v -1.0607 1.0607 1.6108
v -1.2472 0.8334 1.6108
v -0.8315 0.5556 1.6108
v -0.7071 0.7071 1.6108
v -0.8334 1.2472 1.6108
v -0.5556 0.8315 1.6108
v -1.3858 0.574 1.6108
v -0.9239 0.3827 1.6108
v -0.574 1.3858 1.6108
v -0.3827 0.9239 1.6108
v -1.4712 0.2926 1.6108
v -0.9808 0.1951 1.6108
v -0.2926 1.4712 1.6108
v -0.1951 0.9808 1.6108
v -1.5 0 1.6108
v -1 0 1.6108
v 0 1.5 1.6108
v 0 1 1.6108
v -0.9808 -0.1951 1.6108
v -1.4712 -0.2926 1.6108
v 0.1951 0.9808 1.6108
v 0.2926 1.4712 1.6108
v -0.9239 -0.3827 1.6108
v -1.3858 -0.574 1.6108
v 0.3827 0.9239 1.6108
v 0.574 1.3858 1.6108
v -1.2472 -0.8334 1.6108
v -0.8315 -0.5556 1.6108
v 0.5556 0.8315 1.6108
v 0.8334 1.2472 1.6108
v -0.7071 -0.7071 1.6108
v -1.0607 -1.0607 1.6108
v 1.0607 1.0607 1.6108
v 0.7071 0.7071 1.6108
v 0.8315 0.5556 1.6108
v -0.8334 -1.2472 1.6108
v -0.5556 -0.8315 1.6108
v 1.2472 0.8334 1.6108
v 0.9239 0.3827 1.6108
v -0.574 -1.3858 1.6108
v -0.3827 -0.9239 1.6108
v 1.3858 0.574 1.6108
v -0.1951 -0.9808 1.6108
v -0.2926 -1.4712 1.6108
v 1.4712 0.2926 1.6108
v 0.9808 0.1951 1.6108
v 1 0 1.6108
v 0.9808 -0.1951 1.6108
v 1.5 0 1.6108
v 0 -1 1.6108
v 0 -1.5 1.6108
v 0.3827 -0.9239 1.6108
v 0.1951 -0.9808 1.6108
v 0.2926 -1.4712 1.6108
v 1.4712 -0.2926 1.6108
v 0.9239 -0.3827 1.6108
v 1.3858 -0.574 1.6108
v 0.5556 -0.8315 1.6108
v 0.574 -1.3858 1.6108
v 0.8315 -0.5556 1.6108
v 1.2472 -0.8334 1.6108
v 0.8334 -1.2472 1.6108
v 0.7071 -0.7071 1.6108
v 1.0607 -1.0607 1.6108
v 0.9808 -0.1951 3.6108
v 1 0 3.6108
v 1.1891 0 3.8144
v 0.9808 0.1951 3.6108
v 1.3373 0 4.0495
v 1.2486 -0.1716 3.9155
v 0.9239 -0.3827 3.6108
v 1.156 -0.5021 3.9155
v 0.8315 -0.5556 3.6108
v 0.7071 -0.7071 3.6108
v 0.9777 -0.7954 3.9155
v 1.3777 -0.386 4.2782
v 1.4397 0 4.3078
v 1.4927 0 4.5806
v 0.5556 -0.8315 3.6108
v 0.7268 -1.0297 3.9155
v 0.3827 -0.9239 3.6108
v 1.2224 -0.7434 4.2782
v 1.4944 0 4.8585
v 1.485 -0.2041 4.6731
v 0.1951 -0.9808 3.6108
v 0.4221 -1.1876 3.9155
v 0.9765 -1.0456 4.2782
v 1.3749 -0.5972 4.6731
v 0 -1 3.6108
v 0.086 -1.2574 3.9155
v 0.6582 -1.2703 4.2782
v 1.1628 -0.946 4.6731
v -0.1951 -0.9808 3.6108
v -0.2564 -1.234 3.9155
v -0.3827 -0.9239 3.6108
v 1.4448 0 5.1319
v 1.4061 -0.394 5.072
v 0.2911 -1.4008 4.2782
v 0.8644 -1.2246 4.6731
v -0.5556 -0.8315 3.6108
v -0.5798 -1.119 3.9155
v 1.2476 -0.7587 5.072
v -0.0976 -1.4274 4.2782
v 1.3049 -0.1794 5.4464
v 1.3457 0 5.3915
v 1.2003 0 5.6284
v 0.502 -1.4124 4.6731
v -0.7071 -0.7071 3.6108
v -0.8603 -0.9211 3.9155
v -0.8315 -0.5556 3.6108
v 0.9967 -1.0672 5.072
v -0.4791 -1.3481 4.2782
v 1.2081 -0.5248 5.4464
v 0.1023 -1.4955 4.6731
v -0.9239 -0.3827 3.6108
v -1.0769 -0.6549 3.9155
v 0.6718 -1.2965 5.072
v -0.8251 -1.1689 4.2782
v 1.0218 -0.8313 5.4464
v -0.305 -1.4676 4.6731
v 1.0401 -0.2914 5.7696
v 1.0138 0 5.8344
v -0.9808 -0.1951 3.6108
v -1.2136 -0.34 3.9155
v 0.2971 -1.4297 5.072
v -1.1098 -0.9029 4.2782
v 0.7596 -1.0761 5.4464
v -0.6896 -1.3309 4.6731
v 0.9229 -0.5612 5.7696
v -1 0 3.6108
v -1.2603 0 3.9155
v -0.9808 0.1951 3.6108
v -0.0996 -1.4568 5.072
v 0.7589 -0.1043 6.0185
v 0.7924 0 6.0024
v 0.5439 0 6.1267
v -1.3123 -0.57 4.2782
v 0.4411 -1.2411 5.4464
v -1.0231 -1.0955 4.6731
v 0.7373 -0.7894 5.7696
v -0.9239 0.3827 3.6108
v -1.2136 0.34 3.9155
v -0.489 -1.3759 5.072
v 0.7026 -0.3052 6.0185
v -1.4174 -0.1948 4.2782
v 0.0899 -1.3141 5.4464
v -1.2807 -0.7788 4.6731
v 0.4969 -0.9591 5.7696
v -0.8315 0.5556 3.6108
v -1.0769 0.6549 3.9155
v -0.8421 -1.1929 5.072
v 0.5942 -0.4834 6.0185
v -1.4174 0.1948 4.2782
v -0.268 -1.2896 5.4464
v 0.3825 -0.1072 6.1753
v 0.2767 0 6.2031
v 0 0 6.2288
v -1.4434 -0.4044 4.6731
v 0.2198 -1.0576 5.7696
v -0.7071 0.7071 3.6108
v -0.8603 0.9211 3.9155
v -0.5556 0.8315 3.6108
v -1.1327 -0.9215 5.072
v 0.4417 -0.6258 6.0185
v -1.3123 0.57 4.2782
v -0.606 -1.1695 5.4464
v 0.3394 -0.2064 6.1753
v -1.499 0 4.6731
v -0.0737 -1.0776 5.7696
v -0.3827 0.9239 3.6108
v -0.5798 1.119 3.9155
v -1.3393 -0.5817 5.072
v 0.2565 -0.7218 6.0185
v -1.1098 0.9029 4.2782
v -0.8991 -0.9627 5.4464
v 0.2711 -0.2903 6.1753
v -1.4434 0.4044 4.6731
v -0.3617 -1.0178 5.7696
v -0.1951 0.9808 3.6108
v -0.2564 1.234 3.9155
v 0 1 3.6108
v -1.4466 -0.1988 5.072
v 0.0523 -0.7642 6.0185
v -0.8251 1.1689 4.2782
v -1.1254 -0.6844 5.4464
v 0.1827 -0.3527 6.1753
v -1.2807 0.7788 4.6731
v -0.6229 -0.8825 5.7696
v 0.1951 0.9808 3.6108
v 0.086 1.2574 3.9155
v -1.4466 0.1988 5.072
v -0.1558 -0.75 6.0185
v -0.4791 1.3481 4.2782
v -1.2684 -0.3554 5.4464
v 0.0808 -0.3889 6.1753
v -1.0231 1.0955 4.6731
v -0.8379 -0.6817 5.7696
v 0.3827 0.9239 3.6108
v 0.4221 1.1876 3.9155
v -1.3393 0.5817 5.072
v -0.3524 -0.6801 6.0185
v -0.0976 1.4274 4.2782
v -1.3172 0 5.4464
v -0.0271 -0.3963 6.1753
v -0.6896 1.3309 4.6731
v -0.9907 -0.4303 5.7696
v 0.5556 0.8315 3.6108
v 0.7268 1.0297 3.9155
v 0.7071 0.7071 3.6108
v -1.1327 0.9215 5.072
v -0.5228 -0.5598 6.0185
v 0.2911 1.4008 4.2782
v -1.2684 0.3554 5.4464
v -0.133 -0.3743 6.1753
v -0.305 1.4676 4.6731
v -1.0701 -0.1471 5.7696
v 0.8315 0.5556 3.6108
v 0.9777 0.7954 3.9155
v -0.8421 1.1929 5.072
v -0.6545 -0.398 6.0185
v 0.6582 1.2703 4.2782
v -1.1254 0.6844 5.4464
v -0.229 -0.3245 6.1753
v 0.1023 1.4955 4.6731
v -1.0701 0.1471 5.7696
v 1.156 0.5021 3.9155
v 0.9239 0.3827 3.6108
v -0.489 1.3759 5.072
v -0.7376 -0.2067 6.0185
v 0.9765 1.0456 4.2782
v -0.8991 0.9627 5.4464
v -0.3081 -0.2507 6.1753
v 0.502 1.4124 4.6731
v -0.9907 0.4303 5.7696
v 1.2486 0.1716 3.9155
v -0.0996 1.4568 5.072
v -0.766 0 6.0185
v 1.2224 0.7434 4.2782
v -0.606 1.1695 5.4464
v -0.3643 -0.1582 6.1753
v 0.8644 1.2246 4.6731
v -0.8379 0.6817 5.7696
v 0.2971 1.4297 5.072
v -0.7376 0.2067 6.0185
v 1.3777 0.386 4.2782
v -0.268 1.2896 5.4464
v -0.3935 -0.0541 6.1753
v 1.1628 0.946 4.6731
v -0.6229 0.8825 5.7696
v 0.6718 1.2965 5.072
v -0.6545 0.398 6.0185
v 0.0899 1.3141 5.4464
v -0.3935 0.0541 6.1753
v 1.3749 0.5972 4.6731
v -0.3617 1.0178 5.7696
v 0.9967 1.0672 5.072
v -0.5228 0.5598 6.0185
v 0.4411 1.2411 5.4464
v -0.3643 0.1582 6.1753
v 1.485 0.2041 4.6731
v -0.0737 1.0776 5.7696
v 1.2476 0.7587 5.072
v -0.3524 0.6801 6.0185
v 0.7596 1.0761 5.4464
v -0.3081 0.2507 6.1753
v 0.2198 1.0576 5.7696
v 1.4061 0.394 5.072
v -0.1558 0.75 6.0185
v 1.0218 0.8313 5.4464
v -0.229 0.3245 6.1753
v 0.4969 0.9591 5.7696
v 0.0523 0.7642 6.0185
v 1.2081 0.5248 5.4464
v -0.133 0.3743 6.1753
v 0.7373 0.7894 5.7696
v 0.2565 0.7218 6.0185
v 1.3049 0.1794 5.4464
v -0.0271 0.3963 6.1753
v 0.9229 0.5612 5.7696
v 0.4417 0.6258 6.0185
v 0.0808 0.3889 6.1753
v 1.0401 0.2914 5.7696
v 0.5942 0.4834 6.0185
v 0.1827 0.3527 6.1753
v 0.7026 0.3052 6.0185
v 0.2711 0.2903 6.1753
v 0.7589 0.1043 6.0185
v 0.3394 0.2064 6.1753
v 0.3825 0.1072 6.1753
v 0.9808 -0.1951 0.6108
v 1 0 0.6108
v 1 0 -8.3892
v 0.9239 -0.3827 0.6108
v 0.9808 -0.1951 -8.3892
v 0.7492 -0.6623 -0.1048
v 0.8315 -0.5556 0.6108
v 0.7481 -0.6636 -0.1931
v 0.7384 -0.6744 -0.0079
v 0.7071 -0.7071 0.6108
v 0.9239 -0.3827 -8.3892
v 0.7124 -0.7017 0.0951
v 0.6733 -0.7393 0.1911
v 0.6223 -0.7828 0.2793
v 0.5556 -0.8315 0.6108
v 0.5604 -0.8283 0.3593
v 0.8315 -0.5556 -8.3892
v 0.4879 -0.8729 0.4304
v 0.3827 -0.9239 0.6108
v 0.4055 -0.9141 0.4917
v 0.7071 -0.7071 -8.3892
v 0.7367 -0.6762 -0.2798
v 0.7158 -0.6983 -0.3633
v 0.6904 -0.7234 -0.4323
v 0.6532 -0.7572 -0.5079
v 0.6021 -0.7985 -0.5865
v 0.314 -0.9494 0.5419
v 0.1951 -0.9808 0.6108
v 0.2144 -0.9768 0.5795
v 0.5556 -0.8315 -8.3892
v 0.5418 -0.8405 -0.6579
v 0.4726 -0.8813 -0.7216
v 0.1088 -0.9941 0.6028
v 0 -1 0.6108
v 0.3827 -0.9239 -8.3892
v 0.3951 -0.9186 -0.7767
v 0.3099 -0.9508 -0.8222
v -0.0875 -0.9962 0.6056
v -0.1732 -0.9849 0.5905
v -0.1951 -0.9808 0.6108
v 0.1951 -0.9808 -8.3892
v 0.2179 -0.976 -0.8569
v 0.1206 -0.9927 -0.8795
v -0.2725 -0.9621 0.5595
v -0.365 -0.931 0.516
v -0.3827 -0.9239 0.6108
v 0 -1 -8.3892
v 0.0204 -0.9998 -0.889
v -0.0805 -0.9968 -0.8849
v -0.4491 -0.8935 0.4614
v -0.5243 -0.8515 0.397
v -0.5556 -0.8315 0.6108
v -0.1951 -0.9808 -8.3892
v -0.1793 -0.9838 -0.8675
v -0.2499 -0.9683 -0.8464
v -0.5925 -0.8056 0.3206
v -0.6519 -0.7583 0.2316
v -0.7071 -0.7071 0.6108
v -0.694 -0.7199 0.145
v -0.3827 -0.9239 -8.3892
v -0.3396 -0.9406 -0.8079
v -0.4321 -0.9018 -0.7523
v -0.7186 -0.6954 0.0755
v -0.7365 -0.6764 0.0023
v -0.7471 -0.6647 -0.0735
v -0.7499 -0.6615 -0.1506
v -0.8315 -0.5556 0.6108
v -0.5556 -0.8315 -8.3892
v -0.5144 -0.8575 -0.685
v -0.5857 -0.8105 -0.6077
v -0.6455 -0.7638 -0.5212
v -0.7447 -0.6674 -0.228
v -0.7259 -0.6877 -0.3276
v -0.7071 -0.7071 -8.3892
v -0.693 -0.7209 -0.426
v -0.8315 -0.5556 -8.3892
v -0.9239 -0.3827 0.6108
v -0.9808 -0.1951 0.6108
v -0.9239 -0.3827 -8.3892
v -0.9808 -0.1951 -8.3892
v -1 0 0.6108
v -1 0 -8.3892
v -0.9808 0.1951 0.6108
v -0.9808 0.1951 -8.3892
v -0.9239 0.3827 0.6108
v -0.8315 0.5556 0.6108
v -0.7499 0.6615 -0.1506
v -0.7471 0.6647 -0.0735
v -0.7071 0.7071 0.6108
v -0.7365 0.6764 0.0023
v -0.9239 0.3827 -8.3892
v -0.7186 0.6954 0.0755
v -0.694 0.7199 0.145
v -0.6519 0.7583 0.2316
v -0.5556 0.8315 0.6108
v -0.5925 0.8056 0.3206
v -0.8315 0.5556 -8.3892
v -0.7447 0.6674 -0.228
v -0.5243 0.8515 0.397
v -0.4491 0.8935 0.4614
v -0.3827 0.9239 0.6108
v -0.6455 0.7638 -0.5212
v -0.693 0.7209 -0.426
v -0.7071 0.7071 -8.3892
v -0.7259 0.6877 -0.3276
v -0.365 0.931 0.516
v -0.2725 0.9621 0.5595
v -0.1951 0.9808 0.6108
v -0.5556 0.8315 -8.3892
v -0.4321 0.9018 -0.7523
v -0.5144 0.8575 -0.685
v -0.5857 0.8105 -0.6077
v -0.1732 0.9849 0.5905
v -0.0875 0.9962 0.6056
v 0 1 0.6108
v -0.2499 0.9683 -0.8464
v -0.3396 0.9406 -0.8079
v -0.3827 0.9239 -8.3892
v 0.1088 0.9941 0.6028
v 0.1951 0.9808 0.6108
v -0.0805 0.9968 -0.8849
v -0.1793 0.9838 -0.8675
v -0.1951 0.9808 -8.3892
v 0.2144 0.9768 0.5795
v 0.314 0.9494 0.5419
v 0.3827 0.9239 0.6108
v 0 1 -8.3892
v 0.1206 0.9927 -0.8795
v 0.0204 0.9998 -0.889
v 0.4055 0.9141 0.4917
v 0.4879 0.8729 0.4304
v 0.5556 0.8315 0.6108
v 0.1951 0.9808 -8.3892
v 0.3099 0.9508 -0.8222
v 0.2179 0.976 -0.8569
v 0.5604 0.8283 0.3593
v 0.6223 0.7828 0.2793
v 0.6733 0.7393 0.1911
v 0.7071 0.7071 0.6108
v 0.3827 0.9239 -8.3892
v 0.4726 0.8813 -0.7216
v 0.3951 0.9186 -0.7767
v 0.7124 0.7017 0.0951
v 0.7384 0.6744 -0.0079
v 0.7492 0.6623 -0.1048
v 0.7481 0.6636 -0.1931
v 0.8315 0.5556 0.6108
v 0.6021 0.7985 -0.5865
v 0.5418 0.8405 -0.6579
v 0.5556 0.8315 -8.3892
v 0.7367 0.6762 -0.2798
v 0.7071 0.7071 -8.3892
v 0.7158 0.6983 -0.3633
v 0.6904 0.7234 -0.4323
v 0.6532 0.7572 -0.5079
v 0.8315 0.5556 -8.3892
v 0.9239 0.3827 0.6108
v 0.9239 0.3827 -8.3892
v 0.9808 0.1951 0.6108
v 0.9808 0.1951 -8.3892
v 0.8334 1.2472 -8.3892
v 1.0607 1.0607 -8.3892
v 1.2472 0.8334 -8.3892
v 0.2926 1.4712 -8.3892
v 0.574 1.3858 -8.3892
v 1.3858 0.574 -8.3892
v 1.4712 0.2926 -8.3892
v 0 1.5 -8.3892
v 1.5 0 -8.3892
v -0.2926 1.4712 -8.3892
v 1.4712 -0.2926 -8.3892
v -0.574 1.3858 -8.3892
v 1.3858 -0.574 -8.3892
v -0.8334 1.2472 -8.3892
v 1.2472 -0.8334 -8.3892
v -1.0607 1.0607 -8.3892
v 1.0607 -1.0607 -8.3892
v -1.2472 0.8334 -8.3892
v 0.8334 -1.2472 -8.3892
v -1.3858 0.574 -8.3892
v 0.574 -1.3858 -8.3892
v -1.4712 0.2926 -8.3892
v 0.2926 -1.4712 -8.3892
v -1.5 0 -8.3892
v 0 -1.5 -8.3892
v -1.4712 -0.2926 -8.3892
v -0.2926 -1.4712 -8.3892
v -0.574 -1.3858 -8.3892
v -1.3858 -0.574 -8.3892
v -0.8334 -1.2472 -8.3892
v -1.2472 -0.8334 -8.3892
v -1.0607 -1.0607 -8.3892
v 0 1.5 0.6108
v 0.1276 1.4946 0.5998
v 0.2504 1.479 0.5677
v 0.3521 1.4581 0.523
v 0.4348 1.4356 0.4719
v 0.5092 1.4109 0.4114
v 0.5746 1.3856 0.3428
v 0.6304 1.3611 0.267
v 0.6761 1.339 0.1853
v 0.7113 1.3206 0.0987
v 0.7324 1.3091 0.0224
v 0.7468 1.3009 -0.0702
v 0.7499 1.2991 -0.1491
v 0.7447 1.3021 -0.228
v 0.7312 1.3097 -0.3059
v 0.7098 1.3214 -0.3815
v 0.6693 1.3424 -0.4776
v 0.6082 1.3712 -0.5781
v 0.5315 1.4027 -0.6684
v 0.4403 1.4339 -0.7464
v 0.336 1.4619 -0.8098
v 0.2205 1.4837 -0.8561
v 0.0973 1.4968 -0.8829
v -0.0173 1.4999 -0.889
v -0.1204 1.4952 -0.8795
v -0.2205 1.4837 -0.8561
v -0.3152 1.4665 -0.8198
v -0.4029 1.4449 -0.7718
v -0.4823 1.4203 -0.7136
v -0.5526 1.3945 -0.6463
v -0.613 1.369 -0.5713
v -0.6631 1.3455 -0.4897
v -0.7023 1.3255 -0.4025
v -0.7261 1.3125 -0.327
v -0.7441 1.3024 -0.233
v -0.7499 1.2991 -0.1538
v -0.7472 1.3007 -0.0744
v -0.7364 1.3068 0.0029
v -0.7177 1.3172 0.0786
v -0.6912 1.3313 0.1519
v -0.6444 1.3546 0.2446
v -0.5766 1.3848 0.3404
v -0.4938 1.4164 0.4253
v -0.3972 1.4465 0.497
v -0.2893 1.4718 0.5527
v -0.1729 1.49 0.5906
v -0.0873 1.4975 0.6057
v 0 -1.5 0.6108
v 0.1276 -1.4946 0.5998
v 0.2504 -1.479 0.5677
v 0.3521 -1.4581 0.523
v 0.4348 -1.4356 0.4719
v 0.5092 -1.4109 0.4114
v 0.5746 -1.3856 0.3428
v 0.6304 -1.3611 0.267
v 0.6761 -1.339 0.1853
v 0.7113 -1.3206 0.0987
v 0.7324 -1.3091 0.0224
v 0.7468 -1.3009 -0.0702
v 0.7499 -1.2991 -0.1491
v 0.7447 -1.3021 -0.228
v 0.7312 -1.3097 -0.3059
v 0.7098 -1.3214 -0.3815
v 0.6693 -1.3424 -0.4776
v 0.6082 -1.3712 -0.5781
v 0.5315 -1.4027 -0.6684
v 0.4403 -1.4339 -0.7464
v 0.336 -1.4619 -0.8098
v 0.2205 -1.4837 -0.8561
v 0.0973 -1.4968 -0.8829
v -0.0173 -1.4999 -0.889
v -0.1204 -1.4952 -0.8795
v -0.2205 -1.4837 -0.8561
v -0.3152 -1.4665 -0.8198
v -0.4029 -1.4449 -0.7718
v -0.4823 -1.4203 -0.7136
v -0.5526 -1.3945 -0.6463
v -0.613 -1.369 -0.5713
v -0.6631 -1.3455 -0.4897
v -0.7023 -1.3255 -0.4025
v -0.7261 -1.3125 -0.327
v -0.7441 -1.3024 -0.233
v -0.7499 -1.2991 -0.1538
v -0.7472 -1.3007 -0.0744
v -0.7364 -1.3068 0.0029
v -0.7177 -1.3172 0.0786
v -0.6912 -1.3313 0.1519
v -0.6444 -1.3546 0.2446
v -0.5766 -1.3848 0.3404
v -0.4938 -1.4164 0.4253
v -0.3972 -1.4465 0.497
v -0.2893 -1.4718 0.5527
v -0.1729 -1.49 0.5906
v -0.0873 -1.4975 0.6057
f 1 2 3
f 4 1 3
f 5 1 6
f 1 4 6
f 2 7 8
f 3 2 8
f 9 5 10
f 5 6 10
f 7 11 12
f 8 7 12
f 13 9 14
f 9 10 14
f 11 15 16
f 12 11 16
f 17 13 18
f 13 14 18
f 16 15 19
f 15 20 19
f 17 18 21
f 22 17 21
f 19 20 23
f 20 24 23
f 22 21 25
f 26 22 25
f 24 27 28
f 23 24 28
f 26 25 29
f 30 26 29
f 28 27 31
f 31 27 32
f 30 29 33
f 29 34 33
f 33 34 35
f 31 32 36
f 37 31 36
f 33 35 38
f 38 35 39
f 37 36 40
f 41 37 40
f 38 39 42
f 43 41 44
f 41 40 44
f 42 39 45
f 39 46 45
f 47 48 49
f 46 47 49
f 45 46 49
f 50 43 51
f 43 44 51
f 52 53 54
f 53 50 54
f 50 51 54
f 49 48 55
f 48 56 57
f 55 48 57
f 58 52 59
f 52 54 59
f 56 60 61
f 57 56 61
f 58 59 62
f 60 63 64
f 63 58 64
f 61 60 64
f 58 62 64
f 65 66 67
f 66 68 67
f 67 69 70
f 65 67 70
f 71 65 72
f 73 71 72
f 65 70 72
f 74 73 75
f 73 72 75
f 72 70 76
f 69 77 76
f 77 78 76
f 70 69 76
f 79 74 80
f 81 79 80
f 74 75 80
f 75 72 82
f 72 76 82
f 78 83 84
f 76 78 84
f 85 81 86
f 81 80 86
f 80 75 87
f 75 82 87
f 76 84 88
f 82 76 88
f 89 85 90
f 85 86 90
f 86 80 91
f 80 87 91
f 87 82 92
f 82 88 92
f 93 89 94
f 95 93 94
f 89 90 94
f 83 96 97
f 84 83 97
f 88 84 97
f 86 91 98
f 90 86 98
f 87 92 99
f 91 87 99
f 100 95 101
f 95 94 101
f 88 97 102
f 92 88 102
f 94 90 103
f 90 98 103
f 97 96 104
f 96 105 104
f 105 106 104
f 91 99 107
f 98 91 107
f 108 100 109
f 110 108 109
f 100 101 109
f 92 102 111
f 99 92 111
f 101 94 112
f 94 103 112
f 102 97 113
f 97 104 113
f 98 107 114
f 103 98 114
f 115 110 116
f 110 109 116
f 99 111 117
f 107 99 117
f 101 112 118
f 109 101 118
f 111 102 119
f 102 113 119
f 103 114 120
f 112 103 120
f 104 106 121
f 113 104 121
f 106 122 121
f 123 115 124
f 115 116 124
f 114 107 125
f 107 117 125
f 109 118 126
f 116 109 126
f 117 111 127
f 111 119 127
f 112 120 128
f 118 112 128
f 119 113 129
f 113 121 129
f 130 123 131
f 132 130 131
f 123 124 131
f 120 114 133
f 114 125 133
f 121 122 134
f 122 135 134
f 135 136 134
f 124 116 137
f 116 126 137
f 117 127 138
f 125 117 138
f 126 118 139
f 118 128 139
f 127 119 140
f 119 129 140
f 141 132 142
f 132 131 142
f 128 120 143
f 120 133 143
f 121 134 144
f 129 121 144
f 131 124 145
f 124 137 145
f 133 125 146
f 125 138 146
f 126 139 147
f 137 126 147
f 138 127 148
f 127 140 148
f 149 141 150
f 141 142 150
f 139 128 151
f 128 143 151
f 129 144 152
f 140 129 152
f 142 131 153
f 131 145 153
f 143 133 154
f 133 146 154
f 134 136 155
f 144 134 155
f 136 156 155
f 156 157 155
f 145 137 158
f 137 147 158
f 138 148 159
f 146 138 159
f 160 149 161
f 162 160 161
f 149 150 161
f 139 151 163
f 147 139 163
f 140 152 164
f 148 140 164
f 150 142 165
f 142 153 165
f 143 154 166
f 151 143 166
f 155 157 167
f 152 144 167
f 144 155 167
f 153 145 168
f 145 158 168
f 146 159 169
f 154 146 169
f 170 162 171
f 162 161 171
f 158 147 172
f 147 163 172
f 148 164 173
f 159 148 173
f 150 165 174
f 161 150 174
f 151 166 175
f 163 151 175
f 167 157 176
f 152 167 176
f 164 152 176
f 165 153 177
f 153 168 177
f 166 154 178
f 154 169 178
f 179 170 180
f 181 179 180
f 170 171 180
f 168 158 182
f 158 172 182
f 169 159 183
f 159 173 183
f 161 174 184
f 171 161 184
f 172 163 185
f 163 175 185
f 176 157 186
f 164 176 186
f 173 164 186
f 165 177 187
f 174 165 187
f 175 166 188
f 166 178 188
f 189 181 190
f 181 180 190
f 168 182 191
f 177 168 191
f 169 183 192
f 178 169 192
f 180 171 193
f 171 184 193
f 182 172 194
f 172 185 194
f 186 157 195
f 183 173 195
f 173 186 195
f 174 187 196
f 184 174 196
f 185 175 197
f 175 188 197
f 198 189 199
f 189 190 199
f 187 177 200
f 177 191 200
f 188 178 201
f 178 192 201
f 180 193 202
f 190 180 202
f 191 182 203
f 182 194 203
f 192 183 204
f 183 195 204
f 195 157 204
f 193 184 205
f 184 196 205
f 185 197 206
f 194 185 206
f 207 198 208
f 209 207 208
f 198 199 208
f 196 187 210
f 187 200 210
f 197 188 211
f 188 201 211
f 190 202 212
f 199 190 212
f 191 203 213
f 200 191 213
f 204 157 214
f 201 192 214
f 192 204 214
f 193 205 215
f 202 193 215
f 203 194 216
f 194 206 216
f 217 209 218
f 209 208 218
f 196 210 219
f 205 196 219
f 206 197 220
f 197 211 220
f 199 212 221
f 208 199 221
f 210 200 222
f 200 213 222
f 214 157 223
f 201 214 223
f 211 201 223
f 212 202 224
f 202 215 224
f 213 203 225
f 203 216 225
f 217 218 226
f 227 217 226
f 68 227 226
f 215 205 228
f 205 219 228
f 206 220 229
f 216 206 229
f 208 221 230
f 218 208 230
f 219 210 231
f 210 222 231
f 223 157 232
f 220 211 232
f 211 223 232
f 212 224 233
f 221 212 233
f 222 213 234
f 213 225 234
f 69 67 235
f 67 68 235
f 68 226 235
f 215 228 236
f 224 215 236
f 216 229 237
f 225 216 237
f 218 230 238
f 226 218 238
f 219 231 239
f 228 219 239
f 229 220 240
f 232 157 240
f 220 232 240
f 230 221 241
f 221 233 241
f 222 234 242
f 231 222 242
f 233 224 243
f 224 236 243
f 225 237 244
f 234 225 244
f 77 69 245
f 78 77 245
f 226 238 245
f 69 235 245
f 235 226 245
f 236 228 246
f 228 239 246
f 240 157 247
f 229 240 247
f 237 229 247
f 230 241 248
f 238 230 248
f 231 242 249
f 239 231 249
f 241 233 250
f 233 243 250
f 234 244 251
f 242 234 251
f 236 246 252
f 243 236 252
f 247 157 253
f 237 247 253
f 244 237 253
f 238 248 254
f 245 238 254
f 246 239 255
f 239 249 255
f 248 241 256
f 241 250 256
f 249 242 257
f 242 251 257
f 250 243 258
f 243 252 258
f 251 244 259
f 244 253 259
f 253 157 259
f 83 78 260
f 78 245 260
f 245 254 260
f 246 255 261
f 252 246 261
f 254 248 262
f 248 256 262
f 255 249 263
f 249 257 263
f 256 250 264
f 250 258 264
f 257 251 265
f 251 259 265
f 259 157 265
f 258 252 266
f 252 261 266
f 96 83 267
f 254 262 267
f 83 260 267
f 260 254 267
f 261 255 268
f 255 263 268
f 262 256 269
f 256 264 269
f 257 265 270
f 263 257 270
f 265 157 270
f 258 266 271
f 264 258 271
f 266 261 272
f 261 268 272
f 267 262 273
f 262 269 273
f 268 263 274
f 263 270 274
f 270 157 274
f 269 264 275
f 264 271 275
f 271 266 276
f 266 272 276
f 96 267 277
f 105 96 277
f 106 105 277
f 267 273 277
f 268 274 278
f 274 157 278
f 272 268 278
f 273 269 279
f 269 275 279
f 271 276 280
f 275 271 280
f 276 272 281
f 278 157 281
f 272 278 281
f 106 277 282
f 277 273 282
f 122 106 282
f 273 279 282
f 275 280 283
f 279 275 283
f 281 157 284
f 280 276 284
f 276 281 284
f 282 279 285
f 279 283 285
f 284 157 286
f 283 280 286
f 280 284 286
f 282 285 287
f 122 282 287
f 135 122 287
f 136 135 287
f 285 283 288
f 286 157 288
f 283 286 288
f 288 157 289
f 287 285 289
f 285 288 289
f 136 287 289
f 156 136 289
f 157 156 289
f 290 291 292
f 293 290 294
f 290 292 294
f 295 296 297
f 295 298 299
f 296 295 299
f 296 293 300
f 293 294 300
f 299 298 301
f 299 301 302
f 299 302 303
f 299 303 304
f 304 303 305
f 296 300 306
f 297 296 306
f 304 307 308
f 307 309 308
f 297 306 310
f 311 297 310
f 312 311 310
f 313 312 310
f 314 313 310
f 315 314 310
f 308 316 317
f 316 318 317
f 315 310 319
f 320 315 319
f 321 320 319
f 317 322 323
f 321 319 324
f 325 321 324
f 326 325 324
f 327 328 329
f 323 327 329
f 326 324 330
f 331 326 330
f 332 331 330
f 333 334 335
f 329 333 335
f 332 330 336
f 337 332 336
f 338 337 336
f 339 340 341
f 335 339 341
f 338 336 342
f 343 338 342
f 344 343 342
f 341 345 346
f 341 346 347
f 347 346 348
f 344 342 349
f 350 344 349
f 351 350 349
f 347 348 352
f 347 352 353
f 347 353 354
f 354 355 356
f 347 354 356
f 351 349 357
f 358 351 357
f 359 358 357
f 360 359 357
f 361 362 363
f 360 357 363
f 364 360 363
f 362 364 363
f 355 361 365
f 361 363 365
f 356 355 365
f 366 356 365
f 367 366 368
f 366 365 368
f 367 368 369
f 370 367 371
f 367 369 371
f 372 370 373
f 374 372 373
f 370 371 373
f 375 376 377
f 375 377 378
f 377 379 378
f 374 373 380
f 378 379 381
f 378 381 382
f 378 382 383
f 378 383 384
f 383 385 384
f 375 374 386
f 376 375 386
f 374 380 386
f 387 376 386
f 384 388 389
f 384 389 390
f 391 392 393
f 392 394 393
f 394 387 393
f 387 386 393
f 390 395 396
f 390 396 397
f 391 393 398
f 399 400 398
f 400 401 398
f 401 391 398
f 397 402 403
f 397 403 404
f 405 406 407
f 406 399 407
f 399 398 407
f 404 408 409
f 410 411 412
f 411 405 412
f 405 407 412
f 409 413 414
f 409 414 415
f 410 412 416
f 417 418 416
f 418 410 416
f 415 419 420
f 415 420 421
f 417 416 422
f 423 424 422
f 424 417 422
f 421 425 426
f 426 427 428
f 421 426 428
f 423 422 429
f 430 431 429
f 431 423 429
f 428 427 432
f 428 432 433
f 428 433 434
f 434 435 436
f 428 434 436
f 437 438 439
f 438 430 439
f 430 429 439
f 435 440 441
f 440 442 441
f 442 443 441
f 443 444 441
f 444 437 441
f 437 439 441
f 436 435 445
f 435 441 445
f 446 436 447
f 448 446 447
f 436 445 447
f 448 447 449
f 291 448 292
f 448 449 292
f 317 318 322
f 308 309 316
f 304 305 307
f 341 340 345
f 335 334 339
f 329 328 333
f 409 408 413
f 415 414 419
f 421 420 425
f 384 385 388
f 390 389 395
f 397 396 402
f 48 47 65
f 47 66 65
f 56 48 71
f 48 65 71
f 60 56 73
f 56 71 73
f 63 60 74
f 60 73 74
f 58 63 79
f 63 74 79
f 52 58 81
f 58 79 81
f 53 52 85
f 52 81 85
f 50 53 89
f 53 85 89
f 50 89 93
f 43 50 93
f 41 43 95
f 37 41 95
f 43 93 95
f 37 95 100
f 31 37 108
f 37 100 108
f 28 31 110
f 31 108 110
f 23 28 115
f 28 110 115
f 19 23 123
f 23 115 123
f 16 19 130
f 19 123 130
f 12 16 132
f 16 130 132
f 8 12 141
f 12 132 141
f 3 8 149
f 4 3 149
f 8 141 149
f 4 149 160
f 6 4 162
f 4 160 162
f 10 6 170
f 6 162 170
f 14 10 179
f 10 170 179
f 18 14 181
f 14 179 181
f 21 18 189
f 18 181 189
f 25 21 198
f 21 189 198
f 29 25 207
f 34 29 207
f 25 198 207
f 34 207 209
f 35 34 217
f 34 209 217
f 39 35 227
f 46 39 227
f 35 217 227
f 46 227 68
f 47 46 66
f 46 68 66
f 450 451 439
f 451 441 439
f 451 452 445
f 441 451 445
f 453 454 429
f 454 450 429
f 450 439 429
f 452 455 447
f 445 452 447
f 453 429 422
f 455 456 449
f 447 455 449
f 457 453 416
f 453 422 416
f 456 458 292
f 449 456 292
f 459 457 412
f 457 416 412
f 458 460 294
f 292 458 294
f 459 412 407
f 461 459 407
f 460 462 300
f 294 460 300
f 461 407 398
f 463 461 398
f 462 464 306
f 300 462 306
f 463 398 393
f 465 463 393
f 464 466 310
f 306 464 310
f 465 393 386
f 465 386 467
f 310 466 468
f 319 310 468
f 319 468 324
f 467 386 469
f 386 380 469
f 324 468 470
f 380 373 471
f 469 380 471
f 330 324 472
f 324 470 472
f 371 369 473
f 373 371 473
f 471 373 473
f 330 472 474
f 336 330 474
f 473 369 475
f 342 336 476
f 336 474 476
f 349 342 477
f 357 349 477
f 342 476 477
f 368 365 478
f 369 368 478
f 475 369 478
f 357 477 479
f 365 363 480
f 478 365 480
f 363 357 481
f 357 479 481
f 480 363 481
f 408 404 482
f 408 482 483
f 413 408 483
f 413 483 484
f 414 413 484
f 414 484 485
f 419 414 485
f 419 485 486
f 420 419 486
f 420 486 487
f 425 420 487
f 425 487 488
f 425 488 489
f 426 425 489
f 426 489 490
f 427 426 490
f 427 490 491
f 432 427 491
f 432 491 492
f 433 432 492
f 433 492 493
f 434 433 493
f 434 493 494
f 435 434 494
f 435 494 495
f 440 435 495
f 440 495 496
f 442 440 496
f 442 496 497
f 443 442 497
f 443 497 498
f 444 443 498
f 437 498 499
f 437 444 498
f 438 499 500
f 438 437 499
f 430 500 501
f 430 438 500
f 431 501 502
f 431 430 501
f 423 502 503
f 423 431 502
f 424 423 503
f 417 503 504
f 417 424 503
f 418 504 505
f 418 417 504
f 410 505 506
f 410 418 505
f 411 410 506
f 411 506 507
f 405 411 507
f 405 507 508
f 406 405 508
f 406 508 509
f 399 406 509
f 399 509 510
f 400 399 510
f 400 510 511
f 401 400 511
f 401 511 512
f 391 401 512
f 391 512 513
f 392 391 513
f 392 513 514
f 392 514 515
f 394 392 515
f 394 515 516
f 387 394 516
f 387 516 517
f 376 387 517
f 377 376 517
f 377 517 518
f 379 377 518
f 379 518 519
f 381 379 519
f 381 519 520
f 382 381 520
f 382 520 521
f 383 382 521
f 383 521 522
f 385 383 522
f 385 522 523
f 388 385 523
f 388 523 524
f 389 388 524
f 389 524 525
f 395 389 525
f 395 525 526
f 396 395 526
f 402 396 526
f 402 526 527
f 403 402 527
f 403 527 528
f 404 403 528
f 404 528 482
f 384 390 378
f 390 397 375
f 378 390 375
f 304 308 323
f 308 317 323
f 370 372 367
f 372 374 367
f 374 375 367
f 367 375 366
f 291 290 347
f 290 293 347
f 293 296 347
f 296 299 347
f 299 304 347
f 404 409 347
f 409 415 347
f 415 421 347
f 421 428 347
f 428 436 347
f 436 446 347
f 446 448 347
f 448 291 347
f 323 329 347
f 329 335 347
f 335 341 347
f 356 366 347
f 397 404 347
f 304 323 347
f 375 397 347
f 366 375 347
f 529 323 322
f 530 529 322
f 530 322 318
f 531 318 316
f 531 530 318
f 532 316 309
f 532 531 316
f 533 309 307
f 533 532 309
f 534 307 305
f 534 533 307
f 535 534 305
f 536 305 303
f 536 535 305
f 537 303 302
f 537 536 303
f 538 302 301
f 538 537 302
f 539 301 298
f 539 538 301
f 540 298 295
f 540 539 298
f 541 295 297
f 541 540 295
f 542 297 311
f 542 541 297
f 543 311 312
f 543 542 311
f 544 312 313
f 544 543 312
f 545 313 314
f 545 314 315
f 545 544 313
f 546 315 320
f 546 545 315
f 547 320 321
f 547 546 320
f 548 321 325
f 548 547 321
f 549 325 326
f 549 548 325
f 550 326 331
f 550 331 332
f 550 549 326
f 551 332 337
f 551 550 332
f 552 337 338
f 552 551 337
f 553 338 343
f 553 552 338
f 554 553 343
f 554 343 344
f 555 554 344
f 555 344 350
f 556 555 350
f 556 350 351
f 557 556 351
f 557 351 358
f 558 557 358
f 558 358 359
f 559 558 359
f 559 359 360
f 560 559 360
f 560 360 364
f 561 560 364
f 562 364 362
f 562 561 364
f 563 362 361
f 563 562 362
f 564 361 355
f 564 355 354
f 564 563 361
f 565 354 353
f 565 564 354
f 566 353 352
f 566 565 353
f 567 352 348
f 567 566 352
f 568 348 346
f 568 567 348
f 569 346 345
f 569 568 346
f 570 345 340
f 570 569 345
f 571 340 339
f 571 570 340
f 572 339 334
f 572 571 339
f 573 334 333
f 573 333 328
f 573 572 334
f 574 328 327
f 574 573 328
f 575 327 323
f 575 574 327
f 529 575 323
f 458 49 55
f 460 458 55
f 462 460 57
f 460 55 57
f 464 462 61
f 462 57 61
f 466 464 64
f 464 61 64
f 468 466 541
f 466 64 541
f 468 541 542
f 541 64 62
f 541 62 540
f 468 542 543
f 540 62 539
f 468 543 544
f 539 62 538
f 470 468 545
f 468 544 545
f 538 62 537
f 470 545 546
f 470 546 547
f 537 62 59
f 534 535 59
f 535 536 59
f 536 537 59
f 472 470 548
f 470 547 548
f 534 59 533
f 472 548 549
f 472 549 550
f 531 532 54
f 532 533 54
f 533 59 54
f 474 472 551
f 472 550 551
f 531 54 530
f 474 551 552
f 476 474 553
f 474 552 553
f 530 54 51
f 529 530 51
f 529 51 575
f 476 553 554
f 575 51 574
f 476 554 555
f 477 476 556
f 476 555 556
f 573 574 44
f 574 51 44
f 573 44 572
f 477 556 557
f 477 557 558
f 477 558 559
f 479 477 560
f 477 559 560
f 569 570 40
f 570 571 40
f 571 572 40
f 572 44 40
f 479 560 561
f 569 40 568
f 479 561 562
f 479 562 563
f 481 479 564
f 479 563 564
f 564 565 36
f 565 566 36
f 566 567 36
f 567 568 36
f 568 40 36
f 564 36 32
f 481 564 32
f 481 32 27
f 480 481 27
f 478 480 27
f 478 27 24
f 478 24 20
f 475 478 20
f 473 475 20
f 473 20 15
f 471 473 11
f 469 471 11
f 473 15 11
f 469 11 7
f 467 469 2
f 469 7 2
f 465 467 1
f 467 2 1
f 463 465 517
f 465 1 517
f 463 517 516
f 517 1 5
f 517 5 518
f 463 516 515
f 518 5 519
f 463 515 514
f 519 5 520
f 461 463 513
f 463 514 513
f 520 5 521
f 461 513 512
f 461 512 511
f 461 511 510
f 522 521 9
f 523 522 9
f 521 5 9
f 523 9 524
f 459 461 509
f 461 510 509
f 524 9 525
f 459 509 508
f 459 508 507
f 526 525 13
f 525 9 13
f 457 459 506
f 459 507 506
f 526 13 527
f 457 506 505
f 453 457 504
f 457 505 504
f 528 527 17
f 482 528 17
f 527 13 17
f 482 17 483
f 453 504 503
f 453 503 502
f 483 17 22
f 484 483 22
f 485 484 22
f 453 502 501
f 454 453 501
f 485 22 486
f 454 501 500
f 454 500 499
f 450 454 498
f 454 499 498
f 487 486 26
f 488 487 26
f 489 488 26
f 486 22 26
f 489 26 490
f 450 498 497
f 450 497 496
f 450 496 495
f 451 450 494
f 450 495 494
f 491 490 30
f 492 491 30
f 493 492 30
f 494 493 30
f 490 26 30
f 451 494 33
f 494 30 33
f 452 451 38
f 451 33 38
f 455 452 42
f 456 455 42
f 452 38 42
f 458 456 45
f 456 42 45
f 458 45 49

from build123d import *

# Parameters (mm, degrees)
TAGLIO_ESTRUSIONE1_DEPTH      = 9.653279386
TAGLIO_ESTRUSIONE1_DEPTH_BACK = 9.653279386
SCHIZZO2_R                    = 0.75


with BuildPart() as part:
    # Schizzo1 → Rivoluzione1 (revolve)
    with BuildSketch(Plane(origin=(0, 0, 0), x_dir=(0, 0, -1), z_dir=(1, 0, 0)), mode=Mode.PRIVATE) as rivoluzione1_sk:
        with BuildLine():
            Line((8.389233822, 1.5), (-1.610766178, 1.5))
            Line((-1.610766178, 1.5), (-1.610766178, 1))
            Line((-1.610766178, 1), (-3.610766178, 1))
            ThreePointArc((-3.610766178, 1), (-5.264033301, 1.401258538), (-6.228800167, 0))
            Line((-6.228800167, 0), (-0.610766178, 0))
            Line((-0.610766178, 0), (-0.610766178, 1))
            Line((-0.610766178, 1), (8.389233822, 1))
            Line((8.389233822, 1), (8.389233822, 1.5))
        make_face()
    revolve(rivoluzione1_sk.sketch.rotate(Axis((0, 0, 6.228800167), (0, 0, -1)), 90), axis=Axis((0, 0, 6.228800167), (0, 0, -1)))

    # Schizzo2 → Taglio-Estrusione1 (cut, two sides: drawn at the far end of the back side and taken through both)
    with BuildSketch(Plane(origin=(0, 0, 0), x_dir=(1, 0, 0), z_dir=(0, 1, 0)).offset(-TAGLIO_ESTRUSIONE1_DEPTH_BACK)):
        with Locations(Location((0, 0.139233822, 0), (0, 0, 270))):
            Circle(SCHIZZO2_R)
    extrude(amount=TAGLIO_ESTRUSIONE1_DEPTH + TAGLIO_ESTRUSIONE1_DEPTH_BACK, mode=Mode.SUBTRACT)


solid = part.part
